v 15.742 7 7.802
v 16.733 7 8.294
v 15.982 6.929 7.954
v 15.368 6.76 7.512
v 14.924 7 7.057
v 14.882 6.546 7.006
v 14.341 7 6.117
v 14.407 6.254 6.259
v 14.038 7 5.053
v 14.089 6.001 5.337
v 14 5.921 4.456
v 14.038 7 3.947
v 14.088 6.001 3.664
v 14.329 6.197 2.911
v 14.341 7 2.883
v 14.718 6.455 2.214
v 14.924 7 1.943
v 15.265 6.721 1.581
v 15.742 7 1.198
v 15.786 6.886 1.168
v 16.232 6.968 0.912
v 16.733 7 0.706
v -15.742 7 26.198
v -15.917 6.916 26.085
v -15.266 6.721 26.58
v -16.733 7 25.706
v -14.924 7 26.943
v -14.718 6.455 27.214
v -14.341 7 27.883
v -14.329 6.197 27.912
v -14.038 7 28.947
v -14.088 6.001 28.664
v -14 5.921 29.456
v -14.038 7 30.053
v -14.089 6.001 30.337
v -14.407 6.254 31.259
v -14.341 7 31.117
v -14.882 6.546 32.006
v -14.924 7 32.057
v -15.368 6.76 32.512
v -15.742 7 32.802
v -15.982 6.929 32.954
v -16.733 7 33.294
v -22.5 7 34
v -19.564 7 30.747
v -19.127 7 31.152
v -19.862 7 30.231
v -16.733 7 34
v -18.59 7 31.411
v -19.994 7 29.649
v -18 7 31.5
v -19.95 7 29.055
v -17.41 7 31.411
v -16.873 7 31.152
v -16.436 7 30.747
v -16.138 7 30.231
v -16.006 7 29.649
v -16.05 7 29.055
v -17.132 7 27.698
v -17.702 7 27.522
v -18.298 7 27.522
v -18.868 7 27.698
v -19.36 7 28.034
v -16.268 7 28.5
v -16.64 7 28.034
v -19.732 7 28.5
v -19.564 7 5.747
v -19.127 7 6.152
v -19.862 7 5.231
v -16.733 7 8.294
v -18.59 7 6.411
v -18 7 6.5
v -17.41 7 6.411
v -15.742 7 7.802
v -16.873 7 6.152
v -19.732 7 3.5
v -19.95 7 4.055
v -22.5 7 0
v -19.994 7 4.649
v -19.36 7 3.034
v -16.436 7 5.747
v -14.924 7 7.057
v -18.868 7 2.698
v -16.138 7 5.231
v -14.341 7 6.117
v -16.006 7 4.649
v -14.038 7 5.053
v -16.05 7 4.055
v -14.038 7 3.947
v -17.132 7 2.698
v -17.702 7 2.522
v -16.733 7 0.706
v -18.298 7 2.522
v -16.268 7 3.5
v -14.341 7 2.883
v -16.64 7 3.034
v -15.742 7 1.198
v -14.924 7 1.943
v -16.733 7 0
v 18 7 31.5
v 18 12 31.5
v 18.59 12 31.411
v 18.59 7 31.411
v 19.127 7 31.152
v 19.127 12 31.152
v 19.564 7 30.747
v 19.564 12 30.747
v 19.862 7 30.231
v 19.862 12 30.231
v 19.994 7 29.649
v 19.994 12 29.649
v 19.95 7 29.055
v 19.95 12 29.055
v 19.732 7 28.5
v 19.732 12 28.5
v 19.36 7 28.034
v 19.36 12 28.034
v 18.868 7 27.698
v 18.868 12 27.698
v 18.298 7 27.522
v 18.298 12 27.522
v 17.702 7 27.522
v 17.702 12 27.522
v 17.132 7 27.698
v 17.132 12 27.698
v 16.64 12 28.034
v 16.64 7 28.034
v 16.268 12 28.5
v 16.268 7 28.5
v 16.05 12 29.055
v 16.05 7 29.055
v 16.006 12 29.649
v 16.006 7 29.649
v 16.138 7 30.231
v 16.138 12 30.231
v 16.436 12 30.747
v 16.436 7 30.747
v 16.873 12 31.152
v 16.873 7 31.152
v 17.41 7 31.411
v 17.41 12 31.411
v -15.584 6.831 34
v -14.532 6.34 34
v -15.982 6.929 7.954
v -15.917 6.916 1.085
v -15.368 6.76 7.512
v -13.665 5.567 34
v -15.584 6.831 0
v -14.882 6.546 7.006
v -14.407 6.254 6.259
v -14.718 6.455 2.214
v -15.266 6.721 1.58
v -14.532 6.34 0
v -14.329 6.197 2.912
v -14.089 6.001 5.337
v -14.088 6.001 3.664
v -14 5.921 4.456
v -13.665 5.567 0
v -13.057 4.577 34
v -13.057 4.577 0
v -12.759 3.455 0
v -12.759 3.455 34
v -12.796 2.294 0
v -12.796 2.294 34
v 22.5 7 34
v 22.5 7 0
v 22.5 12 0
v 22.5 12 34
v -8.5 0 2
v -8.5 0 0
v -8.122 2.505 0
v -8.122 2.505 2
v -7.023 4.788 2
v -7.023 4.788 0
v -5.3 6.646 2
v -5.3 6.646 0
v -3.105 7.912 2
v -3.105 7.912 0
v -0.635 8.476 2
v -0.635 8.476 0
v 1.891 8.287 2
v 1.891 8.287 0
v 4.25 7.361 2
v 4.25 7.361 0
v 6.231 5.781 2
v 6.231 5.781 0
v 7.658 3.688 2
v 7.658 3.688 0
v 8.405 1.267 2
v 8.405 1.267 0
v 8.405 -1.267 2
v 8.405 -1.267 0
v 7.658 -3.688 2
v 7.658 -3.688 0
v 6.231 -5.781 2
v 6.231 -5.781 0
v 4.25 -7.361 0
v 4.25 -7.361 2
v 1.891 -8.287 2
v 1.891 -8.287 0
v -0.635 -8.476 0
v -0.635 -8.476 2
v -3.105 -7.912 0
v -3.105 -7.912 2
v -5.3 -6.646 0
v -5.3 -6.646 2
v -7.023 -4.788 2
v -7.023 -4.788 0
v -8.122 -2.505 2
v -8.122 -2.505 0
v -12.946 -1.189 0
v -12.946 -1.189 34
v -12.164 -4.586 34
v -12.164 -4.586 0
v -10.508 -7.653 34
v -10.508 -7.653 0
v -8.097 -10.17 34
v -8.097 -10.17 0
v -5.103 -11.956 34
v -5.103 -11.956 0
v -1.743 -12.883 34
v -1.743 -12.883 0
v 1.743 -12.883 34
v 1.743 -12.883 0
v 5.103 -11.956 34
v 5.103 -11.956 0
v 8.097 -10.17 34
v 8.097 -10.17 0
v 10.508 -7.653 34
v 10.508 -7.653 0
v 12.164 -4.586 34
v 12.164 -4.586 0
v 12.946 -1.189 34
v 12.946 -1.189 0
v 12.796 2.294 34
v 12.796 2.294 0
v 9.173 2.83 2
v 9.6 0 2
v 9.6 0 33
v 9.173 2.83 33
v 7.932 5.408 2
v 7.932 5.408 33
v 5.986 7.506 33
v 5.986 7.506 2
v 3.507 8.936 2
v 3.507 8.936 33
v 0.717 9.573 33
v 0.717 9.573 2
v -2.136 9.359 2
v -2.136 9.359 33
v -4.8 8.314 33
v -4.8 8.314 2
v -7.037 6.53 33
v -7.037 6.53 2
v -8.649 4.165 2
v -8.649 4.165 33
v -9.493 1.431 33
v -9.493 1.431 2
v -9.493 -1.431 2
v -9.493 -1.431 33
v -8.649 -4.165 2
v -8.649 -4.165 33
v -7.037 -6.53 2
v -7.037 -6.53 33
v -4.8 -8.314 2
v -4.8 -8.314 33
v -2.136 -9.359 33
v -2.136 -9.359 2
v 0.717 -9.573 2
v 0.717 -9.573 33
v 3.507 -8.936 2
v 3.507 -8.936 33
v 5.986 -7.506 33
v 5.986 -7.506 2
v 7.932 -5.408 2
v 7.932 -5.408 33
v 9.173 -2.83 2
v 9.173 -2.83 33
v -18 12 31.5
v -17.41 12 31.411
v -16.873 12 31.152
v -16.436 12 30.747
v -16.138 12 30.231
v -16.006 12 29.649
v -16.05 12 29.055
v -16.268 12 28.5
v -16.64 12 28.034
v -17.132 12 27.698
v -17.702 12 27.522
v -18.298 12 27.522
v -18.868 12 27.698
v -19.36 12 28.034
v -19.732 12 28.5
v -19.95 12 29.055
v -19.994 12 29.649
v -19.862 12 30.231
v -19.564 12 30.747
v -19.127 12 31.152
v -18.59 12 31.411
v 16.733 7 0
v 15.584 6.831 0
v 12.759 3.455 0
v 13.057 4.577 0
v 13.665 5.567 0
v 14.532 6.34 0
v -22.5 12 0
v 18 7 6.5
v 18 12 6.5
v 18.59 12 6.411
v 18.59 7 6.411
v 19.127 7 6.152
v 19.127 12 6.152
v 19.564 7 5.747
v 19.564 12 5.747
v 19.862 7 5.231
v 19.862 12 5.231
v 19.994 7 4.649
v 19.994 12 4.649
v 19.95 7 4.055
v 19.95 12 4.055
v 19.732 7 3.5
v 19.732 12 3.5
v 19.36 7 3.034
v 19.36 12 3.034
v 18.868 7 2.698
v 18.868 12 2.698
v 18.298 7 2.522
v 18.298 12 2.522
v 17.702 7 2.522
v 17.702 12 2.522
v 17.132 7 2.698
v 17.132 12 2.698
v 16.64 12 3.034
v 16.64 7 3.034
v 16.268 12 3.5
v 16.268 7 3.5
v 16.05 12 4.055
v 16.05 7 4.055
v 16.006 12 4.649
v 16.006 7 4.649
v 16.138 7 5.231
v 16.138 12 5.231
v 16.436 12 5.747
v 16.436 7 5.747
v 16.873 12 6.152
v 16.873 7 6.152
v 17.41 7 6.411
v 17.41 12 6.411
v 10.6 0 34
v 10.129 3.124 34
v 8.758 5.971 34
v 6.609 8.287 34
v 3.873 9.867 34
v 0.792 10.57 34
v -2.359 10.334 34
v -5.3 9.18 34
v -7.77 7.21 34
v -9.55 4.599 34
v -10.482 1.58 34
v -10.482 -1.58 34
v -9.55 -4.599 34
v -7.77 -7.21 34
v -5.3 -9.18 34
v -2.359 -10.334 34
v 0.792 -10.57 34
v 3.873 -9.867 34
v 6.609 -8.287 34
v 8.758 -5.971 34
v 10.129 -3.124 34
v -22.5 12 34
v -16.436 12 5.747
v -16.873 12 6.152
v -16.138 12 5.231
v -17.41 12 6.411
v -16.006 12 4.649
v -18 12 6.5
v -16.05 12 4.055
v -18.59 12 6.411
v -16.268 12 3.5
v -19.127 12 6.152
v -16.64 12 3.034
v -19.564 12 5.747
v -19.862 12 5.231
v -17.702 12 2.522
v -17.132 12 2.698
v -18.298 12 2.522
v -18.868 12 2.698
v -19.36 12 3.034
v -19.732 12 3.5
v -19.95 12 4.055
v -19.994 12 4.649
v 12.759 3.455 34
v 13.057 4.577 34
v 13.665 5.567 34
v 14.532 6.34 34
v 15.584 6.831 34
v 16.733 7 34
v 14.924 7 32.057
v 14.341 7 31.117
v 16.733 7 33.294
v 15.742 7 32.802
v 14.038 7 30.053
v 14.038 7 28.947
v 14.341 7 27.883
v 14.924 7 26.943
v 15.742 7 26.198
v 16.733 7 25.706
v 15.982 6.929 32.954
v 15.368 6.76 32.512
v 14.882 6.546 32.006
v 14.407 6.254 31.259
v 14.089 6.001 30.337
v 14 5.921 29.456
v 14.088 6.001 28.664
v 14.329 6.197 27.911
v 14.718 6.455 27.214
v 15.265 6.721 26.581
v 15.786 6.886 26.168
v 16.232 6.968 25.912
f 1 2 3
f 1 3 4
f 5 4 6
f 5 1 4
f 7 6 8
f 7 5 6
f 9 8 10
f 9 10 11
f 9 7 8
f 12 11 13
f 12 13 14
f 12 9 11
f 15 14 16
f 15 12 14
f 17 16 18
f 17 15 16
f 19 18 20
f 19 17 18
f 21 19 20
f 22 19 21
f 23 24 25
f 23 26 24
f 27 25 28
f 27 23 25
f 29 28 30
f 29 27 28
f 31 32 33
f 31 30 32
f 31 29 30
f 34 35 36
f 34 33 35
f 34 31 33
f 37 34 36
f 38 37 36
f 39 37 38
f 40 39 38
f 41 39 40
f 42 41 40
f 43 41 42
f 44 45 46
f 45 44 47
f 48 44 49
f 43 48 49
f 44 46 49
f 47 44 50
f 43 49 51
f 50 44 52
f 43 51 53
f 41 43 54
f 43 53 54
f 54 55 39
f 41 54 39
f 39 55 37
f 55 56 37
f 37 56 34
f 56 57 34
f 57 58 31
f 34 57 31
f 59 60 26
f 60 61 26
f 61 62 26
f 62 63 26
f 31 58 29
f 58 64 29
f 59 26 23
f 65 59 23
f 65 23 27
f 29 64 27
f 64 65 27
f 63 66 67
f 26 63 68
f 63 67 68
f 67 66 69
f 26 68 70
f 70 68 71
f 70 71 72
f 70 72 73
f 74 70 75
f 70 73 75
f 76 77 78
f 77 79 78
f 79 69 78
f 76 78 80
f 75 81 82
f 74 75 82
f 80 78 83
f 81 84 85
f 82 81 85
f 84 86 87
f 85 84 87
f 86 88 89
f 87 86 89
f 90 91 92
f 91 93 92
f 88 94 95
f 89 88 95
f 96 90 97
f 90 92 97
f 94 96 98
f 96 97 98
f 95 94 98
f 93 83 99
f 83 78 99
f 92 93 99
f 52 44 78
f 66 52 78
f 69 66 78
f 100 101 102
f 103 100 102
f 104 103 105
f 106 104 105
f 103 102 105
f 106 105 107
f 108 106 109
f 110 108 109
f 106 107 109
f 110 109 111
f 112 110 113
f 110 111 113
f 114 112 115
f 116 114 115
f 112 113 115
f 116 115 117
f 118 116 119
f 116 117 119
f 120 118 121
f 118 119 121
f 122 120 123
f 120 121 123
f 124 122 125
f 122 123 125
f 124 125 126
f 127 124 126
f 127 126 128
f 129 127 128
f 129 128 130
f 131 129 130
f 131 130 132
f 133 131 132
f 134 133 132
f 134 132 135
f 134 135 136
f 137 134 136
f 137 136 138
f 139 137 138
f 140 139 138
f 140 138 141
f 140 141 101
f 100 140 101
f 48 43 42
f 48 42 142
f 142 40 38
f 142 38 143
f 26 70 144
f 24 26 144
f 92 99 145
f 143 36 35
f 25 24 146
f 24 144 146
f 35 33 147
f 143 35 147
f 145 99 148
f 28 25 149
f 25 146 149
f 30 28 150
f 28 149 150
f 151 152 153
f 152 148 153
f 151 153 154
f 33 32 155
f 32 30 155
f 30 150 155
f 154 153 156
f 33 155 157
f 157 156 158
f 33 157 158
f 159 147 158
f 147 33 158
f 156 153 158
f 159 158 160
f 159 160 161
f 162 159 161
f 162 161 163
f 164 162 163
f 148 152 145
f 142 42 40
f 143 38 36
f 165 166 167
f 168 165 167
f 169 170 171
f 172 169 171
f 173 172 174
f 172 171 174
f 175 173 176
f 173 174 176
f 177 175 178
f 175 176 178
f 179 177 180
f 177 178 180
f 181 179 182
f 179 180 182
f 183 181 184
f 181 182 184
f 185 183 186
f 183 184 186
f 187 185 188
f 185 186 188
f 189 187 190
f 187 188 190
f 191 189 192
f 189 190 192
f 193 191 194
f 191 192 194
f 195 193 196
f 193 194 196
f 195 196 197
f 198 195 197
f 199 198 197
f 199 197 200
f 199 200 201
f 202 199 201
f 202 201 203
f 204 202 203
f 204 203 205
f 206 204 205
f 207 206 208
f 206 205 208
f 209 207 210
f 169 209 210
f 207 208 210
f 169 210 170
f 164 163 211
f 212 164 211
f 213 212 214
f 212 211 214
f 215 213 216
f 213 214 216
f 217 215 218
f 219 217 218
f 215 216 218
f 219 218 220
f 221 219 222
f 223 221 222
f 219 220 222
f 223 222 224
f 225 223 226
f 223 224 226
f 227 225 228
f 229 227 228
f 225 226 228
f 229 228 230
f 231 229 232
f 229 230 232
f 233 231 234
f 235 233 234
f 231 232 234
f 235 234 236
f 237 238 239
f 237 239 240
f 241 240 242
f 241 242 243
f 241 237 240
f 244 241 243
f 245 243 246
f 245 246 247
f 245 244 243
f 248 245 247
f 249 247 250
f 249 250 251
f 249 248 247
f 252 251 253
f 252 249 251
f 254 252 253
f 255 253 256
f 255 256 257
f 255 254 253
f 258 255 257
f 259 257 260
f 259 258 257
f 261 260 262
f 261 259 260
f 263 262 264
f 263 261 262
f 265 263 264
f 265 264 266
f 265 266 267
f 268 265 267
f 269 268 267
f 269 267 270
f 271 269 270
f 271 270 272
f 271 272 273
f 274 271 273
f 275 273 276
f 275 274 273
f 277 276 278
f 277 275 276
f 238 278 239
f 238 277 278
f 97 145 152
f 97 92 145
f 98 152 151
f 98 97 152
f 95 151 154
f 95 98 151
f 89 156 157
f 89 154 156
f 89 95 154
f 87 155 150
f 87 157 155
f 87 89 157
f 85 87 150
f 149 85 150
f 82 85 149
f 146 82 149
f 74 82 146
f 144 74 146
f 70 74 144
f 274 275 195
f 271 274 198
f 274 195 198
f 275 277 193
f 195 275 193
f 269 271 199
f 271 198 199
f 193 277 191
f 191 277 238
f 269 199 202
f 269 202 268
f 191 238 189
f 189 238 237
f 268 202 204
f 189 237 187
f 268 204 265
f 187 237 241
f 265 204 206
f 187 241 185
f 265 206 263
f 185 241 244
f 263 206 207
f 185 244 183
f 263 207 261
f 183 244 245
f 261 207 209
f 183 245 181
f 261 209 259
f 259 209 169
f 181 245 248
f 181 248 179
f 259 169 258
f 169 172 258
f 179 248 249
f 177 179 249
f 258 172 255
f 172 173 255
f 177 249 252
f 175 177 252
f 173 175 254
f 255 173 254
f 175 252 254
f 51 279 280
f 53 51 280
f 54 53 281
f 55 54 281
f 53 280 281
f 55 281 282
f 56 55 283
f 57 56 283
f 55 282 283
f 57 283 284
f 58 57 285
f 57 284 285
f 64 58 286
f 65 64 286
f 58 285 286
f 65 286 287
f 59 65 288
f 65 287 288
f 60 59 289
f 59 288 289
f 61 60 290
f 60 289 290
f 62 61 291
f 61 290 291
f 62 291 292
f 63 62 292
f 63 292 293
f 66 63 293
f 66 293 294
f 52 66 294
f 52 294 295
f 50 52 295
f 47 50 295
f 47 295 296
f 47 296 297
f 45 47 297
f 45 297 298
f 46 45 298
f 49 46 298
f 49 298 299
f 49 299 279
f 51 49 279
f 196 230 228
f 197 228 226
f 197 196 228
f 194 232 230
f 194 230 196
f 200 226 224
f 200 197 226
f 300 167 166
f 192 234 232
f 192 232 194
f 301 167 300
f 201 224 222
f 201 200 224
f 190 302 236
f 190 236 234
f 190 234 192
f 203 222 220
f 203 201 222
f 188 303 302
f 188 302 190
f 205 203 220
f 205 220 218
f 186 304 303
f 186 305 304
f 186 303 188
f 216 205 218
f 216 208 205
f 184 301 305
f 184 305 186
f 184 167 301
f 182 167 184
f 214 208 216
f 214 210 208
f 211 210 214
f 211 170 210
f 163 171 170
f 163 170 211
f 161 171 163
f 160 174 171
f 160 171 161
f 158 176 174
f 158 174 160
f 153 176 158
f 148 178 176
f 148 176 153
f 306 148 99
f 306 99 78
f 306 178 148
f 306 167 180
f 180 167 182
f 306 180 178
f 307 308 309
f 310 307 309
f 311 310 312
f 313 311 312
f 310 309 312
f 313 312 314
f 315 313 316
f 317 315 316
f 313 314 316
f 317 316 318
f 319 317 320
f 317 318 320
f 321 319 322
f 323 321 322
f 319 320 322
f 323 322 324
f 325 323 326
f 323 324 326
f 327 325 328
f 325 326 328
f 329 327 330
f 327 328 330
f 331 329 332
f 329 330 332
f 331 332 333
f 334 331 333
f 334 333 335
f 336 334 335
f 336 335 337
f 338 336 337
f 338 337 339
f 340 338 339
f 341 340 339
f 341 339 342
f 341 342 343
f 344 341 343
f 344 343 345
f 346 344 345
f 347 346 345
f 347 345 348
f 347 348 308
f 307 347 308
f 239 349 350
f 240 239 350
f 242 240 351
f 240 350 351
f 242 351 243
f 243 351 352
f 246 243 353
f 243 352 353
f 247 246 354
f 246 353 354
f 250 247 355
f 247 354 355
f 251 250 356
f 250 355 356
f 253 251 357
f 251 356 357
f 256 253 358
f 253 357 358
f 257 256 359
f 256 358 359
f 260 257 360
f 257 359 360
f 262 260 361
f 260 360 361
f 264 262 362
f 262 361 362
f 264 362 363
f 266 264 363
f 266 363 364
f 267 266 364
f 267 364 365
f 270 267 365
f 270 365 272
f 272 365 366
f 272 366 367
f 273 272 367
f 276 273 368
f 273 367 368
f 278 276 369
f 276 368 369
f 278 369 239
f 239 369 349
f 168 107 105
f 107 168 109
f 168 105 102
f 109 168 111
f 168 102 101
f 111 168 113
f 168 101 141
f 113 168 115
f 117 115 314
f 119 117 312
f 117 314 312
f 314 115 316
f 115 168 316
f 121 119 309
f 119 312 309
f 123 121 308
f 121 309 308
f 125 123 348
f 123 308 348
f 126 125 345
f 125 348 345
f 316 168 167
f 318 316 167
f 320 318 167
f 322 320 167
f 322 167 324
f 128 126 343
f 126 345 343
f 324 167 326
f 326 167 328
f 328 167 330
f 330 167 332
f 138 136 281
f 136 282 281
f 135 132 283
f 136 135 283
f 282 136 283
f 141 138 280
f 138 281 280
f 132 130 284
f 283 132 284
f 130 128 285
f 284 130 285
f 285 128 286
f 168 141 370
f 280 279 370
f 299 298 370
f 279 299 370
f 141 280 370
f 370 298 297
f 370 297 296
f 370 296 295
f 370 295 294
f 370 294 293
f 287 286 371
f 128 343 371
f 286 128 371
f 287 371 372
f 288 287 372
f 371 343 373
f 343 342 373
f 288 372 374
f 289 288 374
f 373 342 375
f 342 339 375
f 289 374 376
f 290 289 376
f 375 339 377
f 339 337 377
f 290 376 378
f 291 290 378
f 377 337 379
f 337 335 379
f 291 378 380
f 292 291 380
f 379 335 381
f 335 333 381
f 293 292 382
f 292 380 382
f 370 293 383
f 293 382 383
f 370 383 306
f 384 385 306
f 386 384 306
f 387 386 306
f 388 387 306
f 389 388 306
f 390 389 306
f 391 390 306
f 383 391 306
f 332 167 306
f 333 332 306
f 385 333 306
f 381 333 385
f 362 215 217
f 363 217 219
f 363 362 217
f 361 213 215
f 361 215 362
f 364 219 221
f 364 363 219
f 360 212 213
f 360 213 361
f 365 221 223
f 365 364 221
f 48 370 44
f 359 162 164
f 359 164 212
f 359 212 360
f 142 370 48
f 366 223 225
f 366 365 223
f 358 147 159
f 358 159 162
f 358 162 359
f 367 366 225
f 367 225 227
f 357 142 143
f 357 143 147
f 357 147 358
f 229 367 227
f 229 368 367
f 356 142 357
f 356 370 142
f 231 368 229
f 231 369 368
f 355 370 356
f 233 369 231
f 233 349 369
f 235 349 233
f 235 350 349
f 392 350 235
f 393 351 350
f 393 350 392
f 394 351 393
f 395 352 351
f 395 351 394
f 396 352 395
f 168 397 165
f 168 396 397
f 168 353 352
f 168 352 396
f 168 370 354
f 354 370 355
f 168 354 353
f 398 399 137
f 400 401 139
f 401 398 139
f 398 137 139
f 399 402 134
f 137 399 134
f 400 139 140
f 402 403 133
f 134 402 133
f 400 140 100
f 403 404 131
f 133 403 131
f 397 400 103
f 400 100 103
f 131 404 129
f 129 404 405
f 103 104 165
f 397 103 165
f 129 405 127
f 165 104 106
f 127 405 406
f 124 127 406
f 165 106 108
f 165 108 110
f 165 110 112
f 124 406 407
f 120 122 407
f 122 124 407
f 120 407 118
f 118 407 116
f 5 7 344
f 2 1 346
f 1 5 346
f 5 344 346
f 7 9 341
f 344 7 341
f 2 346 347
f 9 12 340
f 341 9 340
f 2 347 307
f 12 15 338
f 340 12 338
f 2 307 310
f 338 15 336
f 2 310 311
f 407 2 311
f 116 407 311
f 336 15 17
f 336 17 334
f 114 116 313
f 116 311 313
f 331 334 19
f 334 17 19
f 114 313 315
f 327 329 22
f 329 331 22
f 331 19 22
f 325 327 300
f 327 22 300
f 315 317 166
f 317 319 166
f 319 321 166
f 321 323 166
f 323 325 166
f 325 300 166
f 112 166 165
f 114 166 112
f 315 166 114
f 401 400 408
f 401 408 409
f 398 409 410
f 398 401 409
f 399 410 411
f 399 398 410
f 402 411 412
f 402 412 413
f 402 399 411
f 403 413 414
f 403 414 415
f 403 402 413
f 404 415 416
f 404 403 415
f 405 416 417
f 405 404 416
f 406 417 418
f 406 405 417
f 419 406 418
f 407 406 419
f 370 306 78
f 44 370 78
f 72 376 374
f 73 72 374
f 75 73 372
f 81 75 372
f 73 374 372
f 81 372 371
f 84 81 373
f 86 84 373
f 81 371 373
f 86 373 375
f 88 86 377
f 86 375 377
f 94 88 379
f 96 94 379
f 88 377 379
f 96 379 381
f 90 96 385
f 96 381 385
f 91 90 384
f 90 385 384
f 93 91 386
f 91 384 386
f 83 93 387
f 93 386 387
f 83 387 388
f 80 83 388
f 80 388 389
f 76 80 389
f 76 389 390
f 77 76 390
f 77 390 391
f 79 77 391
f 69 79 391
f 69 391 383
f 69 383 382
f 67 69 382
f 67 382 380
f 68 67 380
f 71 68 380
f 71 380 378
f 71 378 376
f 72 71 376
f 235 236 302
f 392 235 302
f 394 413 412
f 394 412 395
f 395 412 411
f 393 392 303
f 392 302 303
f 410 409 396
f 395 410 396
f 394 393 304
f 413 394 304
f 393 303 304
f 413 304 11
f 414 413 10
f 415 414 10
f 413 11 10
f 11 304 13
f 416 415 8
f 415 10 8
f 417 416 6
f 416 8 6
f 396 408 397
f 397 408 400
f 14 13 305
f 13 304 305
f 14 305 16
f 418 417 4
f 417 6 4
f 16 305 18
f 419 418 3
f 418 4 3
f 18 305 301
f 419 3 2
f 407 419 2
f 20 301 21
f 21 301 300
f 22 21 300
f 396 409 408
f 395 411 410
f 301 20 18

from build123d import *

# Parameters (mm, degrees)
SKETCH1_R           = 9.6
BOSS_EXTRUDE1_DEPTH = 34
SKETCH2_R           = 2
CUT_EXTRUDE1_DEPTH  = 34
SKETCH3_R           = 4
CUT_EXTRUDE2_DEPTH  = 34
SKETCH4_R           = 9.6
SKETCH4_R_2         = 8.5
BOSS_EXTRUDE2_DEPTH = 2
CHAMFER1_SIZE       = 1


with BuildPart() as part:
    # Sketch1 → Boss-Extrude1 (new body)
    with BuildSketch(Plane.XY):
        with BuildLine():
            Line((16.733200531, 7), (22.5, 7))
            Line((22.5, 7), (22.5, 12))
            Line((22.5, 12), (-22.5, 12))
            Line((-22.5, 12), (-22.5, 7))
            Line((-22.5, 7), (-16.733200531, 7))
            ThreePointArc((-16.733200531, 7), (-13.665340575, 5.566755792), (-12.795976876, 2.294117647))
            ThreePointArc((-12.795976876, 2.294117647), (0, -13), (12.795976876, 2.294117647))
            ThreePointArc((12.795976876, 2.294117647), (13.665340575, 5.566755792), (16.733200531, 7))
        make_face()
        Circle(SKETCH1_R, mode=Mode.SUBTRACT)
    extrude(amount=BOSS_EXTRUDE1_DEPTH)

    # Sketch2 → Cut-Extrude1 (cut)
    with BuildSketch(Plane(origin=(0, 12, 0), x_dir=(1, 0, 0), z_dir=(0, 1, 0))):
        with Locations(Location((-18, -29.5, 0), (0, 0, 270))):  # turned: the seam where the file's is
            Circle(SKETCH2_R)
        with Locations(Location((18, -29.5, 0), (0, 0, 270))):  # turned: the seam where the file's is
            Circle(SKETCH2_R)
        with Locations(Location((18, -4.5, 0), (0, 0, 270))):  # turned: the seam where the file's is
            Circle(SKETCH2_R)
        with Locations(Location((-18, -4.5, 0), (0, 0, 270))):  # turned: the seam where the file's is
            Circle(SKETCH2_R)
    extrude(amount=-CUT_EXTRUDE1_DEPTH, mode=Mode.SUBTRACT)

    # Sketch3 → Cut-Extrude2 (cut)
    with BuildSketch(Plane.XZ.offset(-7)):
        with Locations((-18, 29.5)):
            Circle(SKETCH3_R)
        with Locations((-18, 4.5)):
            Circle(SKETCH3_R)
        with Locations((18, 4.5)):
            Circle(SKETCH3_R)
        with Locations((18, 29.5)):
            Circle(SKETCH3_R)
    extrude(amount=CUT_EXTRUDE2_DEPTH, mode=Mode.SUBTRACT)

    # Sketch4 → Boss-Extrude2 (add)
    with BuildSketch(Plane(origin=(0, 0, 0), x_dir=(-1, 0, 0), z_dir=(0, 0, -1))):
        Circle(SKETCH4_R)
        Circle(SKETCH4_R_2, mode=Mode.SUBTRACT)
    extrude(amount=-BOSS_EXTRUDE2_DEPTH)

    # Chamfer1
    chamfer1_edges = [part.edges().sort_by_distance(p)[0] for p in [
        (-9.6, 0, 34),
    ]]
    chamfer(chamfer1_edges, length=CHAMFER1_SIZE)


solid = part.part
